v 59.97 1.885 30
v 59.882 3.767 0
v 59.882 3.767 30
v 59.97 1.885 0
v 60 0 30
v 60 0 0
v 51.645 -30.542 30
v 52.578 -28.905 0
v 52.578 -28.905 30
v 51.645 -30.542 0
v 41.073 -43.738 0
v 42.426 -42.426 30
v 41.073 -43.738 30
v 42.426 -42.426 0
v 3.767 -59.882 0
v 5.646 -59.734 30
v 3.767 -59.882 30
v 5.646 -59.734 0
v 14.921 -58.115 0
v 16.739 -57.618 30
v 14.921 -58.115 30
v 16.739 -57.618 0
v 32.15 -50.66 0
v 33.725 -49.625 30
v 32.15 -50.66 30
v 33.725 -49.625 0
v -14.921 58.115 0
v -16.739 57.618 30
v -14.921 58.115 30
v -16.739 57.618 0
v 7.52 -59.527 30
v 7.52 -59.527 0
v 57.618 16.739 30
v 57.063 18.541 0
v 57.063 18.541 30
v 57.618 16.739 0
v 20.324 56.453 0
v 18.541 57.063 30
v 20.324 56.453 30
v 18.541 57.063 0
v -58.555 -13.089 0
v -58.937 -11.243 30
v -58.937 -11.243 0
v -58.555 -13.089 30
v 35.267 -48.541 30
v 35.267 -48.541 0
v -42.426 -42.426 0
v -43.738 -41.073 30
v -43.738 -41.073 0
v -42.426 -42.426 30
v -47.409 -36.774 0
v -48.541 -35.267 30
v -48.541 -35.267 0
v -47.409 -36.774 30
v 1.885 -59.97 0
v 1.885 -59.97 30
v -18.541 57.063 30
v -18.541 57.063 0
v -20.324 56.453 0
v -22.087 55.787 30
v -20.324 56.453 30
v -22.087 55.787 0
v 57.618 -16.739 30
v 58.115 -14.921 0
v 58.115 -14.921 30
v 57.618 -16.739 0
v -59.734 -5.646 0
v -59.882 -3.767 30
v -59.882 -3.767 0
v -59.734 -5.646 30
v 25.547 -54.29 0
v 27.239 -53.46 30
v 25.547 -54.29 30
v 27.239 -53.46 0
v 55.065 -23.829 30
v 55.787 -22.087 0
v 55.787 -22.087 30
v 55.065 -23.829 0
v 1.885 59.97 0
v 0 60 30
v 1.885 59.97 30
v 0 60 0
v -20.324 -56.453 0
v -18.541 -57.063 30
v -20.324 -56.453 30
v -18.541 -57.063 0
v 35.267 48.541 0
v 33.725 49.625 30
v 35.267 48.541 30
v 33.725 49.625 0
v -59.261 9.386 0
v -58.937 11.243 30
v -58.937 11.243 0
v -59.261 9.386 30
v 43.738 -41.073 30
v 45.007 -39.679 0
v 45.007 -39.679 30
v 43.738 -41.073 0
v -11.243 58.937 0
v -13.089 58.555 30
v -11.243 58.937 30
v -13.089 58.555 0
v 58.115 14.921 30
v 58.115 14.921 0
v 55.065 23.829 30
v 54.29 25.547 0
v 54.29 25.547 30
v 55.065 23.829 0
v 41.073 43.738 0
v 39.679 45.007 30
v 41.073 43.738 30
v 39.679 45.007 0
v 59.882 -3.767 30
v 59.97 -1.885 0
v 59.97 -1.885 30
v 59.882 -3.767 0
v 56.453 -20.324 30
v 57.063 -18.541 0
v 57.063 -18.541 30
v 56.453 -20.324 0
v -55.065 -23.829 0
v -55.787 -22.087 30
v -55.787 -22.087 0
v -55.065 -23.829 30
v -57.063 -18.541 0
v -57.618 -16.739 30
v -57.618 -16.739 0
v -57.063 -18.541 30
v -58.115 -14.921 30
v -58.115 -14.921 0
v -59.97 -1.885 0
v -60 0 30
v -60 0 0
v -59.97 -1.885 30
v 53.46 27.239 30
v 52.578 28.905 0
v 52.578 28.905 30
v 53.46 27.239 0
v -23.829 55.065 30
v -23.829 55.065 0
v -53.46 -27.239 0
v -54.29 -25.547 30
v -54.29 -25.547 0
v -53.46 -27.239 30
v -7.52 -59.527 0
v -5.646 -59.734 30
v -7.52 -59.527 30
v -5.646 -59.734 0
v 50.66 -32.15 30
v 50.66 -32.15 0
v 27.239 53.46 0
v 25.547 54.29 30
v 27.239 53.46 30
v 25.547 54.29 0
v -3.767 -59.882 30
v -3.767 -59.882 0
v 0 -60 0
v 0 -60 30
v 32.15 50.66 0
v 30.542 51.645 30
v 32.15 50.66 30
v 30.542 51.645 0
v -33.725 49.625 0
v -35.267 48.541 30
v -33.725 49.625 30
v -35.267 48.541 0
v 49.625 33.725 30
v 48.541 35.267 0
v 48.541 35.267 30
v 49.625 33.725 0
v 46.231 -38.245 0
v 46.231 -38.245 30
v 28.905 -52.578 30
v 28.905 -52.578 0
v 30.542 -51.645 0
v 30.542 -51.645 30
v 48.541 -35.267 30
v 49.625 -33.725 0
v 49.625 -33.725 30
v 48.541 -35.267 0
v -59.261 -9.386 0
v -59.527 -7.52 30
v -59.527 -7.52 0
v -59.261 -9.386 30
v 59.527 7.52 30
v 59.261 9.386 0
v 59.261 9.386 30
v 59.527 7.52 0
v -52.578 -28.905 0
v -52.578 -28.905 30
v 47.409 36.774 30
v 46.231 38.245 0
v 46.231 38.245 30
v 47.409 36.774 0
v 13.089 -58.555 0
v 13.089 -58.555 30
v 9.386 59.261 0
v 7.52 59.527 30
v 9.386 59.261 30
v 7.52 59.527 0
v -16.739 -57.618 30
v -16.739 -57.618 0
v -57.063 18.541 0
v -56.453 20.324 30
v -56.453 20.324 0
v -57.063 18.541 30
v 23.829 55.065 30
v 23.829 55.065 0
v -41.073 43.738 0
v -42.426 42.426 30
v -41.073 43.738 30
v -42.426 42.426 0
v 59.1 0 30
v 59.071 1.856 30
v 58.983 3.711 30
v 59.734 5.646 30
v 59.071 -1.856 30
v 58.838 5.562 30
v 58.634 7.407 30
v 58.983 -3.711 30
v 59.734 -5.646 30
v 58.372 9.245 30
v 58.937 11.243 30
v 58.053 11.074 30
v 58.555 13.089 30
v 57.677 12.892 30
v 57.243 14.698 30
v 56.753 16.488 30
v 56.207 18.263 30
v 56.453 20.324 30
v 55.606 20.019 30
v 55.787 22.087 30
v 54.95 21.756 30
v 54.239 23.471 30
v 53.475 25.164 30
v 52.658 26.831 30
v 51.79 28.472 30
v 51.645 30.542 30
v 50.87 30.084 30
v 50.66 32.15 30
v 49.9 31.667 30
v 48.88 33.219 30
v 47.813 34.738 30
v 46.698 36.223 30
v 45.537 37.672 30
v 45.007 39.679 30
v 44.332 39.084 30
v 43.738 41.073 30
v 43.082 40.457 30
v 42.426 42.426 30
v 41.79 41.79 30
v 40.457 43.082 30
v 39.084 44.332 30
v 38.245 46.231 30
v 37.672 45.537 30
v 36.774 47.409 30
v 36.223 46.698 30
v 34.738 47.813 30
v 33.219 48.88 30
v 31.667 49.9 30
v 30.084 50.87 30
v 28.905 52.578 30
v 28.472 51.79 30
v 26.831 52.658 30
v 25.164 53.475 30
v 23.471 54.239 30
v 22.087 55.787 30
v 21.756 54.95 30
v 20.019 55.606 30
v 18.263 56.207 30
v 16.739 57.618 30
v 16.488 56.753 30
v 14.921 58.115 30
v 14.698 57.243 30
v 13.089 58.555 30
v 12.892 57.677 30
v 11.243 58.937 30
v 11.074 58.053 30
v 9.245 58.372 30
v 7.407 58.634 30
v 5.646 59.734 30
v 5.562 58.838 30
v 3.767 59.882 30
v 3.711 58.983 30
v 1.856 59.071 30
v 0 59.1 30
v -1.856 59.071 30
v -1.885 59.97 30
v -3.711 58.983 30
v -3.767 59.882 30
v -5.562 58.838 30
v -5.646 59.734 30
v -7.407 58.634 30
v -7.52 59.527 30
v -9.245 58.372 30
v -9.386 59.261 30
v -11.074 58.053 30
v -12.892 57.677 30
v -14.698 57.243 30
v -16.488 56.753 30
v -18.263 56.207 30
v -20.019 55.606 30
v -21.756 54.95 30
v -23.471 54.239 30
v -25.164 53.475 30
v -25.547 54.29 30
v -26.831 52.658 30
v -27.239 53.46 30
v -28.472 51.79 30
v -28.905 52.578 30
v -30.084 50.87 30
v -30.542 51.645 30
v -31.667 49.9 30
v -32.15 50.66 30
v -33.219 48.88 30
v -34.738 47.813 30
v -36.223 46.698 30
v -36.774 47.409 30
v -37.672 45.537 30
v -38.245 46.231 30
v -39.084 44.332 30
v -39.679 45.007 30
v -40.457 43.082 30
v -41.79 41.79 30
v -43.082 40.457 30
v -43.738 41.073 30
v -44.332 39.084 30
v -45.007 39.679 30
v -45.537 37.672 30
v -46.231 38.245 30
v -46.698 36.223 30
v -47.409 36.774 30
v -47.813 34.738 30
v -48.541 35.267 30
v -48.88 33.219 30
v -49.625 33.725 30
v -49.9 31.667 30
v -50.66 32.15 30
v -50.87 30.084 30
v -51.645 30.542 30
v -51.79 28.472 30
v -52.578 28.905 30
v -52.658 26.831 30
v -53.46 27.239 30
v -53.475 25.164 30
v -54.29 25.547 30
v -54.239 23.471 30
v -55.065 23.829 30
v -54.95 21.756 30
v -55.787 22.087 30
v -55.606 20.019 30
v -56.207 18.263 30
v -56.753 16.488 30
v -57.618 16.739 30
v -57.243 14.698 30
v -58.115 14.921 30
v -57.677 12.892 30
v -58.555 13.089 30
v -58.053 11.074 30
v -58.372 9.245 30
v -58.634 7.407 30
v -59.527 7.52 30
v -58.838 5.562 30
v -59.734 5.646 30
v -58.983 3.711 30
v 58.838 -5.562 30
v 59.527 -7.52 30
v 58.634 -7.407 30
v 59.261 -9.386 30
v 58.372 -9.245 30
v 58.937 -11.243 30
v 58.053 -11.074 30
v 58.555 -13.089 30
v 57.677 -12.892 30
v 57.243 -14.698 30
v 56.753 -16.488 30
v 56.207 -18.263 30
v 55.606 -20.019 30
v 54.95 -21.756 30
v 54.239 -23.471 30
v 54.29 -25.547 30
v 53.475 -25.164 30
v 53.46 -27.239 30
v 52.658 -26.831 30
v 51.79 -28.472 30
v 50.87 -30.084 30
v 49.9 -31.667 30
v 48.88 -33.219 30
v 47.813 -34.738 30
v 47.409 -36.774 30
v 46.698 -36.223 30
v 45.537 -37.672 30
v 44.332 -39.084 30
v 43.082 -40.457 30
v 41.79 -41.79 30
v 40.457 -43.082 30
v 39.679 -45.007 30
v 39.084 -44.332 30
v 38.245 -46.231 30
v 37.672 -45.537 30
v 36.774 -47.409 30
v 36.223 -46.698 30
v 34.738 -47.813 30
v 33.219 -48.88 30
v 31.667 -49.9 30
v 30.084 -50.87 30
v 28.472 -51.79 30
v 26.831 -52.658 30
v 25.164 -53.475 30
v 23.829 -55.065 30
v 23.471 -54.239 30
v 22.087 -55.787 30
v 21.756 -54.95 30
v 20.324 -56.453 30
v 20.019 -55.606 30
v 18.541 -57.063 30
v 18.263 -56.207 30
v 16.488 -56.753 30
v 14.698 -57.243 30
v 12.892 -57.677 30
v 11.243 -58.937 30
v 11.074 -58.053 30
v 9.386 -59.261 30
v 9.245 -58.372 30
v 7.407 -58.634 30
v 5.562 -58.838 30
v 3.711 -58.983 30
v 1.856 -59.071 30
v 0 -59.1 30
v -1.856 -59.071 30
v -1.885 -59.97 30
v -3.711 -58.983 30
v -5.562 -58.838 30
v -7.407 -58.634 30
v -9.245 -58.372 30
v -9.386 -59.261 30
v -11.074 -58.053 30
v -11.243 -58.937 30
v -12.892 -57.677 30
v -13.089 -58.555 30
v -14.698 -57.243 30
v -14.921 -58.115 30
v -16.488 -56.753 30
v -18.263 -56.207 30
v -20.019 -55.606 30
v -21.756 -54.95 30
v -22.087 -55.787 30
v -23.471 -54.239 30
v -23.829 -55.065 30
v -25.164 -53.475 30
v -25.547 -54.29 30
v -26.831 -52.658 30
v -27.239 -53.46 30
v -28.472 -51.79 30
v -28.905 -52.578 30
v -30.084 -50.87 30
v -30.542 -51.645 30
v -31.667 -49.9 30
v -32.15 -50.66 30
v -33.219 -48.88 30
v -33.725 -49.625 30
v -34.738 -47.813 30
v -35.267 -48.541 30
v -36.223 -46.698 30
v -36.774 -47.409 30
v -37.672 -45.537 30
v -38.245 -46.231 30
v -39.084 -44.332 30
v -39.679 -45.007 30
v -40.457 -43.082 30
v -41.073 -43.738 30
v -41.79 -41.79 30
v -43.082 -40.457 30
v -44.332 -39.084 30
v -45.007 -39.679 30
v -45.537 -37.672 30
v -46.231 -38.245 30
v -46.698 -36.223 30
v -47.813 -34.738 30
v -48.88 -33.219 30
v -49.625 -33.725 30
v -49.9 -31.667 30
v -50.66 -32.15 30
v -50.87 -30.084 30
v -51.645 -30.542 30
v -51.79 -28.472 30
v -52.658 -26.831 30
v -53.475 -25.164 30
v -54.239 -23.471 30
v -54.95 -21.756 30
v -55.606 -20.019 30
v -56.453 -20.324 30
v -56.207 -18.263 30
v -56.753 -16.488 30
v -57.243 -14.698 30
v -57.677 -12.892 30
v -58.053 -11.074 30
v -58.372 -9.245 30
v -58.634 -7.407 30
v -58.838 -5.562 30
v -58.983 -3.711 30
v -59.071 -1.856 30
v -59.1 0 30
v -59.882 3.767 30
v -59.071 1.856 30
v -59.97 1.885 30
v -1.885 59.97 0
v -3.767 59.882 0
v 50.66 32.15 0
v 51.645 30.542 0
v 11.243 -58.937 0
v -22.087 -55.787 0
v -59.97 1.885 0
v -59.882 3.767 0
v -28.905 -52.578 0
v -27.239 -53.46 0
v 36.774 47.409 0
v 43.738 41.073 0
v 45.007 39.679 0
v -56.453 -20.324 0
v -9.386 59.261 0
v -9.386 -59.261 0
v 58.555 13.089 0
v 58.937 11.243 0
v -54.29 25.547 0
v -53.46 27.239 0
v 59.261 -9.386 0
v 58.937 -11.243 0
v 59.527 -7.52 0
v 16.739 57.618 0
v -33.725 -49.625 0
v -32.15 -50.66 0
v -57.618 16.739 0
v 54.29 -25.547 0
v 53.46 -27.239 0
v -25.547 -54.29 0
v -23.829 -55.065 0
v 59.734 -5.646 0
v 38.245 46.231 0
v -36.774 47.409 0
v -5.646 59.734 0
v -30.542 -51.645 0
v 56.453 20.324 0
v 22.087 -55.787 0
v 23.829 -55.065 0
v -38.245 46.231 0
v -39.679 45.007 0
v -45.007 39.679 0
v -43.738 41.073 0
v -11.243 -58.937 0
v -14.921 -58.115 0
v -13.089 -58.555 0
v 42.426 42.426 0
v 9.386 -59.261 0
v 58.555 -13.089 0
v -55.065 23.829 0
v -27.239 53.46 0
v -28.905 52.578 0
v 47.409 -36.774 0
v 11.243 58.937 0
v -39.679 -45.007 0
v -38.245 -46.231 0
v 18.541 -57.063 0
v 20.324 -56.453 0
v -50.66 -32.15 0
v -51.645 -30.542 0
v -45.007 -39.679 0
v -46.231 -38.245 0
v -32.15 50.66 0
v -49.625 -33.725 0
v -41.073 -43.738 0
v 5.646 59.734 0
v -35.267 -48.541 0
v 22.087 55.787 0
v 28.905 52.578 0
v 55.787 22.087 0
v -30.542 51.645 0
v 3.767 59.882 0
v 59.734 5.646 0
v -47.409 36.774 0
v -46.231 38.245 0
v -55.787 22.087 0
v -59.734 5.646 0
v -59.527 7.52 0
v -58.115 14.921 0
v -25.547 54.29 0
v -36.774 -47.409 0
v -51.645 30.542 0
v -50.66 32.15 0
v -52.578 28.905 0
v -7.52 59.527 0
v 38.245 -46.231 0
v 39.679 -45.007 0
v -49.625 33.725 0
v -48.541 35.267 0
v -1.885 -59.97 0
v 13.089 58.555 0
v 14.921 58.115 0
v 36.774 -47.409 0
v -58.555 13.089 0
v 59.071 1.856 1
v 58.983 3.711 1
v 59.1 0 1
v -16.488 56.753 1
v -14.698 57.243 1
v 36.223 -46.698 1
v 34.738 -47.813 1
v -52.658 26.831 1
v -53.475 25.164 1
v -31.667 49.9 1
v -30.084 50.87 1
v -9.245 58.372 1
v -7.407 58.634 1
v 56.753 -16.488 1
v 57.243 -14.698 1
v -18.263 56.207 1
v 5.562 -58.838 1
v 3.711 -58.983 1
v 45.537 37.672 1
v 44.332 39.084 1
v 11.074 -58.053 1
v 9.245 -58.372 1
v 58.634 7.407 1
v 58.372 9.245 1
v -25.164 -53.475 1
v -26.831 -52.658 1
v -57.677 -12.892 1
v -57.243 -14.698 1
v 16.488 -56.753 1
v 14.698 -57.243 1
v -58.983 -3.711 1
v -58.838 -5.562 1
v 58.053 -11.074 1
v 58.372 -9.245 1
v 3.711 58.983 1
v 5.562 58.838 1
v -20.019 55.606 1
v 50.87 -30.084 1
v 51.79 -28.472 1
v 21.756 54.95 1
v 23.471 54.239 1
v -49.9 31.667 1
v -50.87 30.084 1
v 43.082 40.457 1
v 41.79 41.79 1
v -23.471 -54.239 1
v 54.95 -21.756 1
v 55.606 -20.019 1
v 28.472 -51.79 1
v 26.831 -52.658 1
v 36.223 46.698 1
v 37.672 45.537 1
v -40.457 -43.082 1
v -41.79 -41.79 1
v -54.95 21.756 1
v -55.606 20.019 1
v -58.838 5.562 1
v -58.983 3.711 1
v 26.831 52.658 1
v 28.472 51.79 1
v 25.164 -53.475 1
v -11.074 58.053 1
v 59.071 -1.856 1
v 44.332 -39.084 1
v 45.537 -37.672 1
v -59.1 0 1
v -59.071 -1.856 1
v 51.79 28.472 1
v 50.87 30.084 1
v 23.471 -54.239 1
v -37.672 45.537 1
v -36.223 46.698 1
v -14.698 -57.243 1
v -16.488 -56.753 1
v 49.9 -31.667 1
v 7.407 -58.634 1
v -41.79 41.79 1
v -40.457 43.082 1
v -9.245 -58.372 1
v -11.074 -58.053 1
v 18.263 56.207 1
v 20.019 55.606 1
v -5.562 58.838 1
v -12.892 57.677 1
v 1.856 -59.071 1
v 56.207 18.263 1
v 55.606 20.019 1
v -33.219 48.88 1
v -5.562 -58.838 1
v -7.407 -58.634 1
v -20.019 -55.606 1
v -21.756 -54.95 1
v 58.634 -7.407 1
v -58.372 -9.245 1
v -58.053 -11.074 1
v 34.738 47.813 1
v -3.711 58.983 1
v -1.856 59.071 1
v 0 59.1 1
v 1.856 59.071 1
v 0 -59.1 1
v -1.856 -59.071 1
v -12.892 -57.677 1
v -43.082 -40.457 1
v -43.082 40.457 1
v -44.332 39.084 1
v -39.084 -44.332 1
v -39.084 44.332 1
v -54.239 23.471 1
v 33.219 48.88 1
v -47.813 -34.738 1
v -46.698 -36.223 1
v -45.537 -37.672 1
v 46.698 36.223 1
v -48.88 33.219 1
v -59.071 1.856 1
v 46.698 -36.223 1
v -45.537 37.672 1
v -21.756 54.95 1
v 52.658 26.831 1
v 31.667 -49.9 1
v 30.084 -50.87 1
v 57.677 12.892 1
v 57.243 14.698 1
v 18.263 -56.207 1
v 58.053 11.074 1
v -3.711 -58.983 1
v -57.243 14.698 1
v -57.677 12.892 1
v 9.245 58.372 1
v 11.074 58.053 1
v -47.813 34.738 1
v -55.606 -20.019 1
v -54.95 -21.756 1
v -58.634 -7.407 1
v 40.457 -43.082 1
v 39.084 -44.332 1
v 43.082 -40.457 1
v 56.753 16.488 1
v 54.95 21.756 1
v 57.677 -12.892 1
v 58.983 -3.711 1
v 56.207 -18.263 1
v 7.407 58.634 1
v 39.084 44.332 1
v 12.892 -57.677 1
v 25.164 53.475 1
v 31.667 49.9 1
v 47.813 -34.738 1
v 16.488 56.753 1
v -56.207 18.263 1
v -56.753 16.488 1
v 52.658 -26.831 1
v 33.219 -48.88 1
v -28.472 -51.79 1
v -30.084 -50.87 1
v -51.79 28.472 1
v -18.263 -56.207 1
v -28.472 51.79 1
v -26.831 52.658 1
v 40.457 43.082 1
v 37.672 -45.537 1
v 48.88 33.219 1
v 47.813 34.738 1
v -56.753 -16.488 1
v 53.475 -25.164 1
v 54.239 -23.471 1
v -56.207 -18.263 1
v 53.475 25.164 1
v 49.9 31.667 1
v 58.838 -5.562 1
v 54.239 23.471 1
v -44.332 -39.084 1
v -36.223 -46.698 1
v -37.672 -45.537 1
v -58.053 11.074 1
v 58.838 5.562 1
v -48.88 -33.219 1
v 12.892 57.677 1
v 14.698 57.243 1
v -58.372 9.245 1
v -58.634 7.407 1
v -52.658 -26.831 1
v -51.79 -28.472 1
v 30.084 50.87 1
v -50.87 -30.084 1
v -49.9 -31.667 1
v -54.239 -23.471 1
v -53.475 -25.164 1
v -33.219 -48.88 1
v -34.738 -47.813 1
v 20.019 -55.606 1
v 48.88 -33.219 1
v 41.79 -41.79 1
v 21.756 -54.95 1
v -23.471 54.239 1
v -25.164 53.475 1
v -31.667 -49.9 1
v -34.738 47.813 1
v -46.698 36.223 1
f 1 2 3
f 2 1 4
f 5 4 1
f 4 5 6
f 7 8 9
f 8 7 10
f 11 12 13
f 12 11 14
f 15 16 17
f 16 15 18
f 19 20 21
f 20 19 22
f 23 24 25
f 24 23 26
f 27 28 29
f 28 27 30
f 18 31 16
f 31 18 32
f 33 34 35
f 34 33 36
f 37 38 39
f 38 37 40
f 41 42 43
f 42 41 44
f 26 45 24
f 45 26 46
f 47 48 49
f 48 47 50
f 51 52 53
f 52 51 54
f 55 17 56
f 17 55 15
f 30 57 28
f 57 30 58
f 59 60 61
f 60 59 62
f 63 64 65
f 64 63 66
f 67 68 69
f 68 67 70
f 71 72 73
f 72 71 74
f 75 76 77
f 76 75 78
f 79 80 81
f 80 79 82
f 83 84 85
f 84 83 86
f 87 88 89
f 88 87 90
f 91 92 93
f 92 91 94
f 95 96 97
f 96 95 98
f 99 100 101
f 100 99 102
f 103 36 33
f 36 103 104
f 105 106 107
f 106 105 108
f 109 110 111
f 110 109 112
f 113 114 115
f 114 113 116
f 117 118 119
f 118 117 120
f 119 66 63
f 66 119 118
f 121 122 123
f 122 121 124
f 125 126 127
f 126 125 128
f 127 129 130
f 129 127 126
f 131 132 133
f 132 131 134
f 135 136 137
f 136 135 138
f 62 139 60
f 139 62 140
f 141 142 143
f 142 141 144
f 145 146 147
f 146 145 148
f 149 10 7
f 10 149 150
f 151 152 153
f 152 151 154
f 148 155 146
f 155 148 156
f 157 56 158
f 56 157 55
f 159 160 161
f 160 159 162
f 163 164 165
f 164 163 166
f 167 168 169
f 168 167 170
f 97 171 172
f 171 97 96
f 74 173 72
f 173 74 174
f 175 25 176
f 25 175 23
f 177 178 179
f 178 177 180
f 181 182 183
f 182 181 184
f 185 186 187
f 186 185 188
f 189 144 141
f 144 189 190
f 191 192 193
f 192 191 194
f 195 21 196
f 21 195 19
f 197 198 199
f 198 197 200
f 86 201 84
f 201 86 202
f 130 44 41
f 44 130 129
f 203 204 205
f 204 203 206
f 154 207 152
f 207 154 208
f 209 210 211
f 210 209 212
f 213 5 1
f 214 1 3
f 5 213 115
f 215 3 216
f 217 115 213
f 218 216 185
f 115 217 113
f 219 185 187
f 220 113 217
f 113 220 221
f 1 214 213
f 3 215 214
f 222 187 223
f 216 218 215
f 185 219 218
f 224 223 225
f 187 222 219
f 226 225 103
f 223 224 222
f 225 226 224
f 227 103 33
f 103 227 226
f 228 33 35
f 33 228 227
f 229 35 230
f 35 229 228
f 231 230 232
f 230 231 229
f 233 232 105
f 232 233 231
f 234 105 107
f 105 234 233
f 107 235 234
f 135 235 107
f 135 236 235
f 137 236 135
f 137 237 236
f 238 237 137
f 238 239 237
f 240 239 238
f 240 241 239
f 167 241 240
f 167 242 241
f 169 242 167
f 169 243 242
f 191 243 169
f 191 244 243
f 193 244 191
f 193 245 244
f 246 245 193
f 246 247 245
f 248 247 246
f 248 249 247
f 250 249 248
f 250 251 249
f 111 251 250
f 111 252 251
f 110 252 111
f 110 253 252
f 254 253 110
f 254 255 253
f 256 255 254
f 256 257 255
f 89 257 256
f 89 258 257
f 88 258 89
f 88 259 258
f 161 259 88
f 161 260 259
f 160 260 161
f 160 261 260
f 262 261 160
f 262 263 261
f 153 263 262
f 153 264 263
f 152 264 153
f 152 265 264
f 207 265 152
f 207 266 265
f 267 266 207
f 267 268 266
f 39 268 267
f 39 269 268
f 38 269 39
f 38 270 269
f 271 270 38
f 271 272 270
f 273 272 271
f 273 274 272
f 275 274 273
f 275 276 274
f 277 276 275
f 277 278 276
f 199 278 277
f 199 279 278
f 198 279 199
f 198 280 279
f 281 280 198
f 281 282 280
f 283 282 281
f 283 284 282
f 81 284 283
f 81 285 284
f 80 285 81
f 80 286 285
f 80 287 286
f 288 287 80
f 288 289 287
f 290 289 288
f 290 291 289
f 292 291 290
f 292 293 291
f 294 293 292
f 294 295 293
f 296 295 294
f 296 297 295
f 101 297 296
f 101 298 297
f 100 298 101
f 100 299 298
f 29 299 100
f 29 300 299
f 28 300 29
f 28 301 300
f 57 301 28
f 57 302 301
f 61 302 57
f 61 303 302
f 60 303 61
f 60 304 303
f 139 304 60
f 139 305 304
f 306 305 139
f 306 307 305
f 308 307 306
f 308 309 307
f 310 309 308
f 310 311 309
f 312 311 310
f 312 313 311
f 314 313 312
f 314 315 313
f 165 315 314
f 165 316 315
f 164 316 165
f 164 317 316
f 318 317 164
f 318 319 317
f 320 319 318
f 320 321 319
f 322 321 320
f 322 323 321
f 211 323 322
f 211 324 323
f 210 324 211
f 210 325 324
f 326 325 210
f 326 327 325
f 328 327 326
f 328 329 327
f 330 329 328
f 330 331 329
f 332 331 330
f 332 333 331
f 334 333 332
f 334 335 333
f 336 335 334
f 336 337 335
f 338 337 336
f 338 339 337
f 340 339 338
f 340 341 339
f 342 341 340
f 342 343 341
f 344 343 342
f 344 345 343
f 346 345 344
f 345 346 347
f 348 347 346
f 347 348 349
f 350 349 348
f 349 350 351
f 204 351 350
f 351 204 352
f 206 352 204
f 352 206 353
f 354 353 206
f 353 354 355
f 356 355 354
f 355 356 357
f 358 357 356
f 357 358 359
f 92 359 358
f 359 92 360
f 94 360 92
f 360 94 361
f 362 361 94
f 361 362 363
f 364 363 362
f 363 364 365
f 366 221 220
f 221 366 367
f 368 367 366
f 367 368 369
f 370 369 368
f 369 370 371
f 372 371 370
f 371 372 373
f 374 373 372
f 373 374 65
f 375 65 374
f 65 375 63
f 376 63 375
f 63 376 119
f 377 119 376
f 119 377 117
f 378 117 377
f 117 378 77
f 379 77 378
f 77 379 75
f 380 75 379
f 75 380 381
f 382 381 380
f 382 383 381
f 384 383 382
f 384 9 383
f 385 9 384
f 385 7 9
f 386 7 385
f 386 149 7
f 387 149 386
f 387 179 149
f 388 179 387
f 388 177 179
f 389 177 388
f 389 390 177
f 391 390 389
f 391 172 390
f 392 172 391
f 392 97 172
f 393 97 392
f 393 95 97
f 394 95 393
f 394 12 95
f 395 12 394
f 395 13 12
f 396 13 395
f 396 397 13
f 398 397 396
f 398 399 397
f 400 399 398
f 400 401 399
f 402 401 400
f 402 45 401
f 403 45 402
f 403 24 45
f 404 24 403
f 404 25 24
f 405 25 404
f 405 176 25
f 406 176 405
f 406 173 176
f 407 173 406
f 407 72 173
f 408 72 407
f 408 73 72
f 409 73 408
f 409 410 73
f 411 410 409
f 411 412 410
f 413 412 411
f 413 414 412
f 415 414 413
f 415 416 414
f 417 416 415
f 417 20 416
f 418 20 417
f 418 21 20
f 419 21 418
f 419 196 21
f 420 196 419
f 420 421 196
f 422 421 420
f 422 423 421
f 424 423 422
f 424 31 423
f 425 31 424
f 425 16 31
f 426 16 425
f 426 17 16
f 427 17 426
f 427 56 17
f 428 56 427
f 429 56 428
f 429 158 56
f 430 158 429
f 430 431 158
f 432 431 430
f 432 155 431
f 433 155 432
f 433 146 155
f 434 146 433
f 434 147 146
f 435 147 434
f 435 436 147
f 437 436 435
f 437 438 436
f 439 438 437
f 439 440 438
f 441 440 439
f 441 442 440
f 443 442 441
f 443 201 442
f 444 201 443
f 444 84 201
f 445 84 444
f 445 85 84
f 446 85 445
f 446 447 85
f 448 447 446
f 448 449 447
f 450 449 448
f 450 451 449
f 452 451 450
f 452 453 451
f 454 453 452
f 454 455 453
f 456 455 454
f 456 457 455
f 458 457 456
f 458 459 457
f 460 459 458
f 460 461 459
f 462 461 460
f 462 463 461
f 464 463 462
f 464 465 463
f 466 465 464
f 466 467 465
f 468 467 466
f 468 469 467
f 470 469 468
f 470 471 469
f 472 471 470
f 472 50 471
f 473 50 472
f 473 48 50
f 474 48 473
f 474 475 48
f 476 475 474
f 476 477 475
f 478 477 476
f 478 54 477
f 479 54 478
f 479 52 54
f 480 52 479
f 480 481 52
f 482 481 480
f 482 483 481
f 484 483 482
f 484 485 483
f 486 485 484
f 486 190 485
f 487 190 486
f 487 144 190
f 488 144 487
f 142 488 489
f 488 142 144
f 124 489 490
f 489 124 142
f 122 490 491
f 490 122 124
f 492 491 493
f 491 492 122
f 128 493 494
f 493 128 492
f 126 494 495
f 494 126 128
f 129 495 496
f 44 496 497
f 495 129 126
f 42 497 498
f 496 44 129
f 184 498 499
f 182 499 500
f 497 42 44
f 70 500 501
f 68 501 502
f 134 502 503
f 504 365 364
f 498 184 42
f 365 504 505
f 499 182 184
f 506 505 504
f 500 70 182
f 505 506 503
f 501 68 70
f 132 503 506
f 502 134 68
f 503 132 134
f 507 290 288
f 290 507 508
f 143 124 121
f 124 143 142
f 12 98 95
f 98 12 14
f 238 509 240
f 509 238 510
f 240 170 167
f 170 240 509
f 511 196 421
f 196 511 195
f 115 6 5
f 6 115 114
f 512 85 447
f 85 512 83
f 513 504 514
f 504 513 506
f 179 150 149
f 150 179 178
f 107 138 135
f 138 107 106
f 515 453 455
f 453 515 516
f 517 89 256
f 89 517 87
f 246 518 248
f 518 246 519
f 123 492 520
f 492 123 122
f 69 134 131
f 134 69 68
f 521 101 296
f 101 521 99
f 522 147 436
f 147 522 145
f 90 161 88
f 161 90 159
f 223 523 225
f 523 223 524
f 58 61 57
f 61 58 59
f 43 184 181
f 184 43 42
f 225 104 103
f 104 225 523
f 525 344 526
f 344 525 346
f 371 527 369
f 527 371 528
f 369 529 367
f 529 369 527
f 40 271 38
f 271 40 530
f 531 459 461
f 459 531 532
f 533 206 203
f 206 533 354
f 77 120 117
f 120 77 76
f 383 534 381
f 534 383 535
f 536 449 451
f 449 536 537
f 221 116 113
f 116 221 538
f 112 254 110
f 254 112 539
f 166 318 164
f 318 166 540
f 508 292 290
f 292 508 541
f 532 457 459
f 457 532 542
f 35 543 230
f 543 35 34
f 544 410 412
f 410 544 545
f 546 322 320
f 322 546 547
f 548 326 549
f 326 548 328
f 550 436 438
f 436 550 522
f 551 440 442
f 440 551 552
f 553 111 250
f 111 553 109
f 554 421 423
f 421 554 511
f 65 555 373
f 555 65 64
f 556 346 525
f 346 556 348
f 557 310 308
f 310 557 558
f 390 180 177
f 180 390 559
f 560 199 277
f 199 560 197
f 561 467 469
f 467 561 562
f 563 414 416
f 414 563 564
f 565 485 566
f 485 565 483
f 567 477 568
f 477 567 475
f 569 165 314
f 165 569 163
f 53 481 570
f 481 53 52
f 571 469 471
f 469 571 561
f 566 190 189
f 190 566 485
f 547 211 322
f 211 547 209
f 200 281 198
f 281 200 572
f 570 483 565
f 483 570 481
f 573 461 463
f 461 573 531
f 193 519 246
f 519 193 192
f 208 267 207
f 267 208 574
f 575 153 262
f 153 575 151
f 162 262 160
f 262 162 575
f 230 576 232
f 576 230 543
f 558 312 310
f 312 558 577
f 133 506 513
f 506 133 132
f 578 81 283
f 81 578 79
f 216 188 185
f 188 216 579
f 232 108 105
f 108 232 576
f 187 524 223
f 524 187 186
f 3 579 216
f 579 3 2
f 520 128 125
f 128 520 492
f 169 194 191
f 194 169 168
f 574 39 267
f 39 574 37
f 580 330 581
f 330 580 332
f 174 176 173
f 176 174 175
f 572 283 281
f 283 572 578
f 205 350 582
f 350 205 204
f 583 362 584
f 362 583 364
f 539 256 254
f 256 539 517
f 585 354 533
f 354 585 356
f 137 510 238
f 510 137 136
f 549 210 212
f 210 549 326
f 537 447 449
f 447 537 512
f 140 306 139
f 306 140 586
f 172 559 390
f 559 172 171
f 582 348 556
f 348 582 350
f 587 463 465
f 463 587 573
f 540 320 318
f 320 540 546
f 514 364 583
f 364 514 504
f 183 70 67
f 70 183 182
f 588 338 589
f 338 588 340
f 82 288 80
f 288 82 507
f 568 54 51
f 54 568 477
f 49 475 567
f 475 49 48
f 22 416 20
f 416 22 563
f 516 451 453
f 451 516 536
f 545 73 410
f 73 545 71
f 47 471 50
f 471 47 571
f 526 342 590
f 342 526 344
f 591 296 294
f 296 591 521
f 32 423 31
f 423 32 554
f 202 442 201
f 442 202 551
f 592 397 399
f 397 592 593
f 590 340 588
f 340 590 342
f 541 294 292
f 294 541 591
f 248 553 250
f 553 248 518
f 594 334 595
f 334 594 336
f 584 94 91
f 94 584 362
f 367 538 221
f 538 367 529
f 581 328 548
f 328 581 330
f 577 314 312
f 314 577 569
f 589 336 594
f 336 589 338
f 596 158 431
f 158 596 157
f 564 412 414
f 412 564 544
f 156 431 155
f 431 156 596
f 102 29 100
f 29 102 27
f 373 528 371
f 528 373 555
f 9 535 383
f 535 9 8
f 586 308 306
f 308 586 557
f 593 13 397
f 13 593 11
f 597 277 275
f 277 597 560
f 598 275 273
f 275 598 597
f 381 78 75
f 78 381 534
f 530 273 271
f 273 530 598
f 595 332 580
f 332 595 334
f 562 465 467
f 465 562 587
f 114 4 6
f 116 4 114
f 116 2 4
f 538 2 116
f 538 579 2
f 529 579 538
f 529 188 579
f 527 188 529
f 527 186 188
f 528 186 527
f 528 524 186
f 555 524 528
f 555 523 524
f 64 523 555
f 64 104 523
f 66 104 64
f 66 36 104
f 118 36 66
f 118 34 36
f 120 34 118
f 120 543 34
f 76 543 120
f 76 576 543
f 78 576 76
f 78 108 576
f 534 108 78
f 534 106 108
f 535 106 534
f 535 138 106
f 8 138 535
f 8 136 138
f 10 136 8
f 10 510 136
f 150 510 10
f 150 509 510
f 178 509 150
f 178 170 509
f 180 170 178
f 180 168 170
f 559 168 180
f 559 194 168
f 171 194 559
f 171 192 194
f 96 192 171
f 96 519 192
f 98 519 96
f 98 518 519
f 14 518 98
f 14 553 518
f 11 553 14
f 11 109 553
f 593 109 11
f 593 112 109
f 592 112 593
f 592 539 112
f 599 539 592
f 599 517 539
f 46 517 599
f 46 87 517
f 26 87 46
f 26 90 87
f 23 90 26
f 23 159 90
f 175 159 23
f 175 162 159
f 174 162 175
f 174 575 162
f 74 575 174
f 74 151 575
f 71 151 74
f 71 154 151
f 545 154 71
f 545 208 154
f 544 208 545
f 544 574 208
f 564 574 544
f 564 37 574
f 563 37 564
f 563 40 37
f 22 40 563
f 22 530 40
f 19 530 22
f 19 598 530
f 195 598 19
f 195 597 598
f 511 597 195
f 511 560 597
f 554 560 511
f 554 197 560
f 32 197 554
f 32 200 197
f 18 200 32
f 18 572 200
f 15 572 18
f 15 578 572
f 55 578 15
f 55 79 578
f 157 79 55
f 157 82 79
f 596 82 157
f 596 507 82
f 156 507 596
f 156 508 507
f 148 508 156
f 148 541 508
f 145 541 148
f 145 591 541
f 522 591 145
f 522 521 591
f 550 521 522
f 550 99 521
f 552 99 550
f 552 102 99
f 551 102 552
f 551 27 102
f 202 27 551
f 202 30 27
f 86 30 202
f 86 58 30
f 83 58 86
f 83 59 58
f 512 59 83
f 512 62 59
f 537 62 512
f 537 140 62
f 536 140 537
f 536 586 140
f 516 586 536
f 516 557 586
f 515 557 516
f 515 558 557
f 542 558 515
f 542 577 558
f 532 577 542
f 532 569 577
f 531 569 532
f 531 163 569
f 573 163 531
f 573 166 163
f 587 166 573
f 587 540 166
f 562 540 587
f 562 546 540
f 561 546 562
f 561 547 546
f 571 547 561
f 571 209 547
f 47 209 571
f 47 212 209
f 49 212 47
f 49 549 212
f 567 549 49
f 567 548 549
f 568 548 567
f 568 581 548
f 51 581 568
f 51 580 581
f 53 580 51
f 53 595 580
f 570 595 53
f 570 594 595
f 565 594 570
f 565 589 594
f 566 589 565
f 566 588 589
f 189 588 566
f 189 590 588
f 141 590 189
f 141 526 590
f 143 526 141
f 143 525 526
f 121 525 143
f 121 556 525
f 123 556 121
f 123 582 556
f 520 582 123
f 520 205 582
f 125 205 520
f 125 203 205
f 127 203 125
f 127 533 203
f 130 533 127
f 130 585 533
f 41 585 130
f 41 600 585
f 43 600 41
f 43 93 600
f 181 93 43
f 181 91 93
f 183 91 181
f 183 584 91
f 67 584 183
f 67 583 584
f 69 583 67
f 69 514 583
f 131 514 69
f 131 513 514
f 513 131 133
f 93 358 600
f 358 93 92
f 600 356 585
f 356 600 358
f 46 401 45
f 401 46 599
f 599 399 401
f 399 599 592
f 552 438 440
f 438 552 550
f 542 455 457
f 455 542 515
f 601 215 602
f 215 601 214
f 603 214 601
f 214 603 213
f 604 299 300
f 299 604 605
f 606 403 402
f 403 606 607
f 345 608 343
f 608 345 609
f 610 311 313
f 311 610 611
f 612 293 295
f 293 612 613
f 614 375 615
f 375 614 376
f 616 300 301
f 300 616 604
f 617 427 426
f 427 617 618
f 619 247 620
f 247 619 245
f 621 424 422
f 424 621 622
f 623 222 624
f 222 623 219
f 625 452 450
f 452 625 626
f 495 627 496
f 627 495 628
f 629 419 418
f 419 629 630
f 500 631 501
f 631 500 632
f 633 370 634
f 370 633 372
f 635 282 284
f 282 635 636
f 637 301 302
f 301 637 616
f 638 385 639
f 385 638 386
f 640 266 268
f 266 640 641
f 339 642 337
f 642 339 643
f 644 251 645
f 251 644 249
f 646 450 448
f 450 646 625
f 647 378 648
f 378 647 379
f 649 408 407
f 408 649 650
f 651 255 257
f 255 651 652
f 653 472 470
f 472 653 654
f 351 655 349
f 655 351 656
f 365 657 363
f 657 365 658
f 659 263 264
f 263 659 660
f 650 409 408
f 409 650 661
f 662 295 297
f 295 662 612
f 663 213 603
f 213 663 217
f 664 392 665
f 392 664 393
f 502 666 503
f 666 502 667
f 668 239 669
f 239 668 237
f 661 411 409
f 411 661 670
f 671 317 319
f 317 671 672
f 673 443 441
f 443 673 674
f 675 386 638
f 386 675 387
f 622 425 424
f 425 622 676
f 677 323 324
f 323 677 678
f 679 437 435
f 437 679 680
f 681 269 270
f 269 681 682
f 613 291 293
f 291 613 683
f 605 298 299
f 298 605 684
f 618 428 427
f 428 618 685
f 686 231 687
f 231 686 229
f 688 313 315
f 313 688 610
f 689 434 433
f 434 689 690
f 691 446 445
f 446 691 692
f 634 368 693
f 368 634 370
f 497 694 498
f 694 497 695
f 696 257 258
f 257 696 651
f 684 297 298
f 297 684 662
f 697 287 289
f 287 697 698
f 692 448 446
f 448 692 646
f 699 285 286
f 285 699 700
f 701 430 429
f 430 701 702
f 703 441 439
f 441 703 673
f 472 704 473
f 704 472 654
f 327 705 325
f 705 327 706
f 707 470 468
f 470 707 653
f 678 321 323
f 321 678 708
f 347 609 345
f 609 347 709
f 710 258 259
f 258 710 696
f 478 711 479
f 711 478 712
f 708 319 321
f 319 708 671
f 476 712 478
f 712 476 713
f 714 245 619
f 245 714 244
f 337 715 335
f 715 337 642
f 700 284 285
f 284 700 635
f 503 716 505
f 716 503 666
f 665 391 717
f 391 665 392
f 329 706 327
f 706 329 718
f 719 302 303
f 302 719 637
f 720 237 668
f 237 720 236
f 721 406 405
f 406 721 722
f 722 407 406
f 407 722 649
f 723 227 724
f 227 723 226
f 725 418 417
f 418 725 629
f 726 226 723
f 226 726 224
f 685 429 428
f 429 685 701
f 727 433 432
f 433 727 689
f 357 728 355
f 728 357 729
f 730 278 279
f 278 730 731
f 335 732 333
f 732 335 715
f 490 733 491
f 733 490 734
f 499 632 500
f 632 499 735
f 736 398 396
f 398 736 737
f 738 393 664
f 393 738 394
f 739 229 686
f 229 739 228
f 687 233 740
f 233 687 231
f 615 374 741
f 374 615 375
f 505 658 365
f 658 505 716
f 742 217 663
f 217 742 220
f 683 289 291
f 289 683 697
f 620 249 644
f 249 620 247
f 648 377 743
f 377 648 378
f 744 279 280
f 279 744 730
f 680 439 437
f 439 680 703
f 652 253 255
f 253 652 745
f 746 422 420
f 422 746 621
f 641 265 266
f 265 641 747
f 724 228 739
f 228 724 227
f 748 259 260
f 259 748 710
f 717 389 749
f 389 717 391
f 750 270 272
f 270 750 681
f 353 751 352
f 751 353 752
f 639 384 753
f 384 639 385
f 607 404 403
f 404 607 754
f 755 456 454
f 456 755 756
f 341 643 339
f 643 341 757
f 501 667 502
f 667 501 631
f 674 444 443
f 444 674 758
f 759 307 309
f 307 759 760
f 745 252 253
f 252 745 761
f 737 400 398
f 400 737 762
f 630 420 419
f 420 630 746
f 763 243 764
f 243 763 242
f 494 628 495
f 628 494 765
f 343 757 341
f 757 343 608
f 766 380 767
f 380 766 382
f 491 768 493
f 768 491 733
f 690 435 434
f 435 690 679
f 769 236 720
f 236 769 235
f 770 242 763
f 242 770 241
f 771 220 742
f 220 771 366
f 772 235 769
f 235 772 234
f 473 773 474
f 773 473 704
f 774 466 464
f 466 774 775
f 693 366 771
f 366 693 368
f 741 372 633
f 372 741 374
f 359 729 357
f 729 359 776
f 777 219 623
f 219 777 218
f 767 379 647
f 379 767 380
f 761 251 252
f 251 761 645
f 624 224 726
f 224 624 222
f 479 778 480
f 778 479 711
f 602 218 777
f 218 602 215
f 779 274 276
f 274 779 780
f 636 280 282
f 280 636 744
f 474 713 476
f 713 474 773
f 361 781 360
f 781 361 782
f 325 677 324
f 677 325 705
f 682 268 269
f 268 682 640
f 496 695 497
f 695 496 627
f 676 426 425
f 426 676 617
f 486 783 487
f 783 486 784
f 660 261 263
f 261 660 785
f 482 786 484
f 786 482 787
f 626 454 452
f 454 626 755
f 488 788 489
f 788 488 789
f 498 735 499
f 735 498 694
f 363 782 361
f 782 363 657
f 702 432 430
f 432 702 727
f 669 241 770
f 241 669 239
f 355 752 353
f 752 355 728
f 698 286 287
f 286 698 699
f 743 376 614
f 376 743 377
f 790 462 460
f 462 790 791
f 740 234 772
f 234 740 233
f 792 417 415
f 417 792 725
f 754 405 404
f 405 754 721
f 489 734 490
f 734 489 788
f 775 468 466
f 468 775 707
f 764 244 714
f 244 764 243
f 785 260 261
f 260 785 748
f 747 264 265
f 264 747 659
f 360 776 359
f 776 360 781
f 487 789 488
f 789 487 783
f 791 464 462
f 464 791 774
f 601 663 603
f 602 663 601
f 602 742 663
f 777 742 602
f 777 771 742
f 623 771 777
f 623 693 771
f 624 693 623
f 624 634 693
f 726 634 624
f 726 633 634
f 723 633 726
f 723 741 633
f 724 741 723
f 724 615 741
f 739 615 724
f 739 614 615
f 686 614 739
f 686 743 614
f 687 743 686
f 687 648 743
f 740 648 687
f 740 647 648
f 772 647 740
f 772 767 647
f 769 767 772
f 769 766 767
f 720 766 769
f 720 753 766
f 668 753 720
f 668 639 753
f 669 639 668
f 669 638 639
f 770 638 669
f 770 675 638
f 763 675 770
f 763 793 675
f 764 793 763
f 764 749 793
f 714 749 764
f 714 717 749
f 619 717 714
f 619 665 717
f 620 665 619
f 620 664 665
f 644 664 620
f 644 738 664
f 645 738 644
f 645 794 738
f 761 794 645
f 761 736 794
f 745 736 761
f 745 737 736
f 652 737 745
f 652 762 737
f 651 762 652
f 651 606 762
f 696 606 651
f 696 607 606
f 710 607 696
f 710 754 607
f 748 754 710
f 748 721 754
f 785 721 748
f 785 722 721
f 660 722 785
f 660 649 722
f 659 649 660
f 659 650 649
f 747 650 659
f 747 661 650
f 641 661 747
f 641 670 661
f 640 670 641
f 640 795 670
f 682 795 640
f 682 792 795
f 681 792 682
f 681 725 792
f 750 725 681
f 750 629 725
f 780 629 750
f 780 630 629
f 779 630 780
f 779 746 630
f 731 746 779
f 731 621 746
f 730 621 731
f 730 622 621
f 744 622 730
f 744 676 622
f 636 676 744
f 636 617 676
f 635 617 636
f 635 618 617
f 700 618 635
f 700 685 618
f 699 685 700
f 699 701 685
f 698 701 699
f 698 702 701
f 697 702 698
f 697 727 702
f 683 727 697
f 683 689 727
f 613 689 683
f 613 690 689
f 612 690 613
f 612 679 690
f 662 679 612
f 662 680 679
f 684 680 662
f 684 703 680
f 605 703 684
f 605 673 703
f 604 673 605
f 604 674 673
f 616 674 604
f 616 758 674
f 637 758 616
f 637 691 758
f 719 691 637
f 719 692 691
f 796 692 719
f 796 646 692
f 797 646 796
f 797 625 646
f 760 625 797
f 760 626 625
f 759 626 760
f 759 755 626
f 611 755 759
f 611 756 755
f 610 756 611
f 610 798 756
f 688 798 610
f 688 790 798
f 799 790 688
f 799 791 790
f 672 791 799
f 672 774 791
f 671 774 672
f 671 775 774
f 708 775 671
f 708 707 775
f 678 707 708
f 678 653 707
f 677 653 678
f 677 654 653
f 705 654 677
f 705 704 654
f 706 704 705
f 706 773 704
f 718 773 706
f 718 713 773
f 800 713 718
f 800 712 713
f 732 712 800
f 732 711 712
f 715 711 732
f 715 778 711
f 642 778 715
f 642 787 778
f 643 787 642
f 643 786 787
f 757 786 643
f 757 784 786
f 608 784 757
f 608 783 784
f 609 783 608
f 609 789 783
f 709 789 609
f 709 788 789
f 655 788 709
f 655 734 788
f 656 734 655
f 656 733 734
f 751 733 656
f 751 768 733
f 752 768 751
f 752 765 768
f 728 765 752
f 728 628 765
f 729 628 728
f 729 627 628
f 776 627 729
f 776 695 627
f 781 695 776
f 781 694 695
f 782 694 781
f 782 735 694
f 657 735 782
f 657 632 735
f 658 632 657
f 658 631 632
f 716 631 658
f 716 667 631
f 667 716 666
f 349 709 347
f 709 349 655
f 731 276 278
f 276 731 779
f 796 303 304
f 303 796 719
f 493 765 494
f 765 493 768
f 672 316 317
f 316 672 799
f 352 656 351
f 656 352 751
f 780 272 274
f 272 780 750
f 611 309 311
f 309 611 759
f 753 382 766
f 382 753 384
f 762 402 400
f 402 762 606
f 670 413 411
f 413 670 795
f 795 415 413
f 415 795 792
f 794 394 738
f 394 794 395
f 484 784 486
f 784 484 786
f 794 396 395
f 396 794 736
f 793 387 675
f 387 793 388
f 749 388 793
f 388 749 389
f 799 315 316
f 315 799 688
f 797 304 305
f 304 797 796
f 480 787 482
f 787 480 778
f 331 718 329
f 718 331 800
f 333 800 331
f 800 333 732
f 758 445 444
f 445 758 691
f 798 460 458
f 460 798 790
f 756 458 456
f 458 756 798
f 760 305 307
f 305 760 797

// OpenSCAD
diameter = 2 * 60;
height = 90 - 20;

module jar() {
    difference(){
        union() {
            cylinder(d = diameter, h = height, center = false, $fn = 200);
            cylinder(d = diameter - 2, h = height + 20, center = false, $fn = 200);
        }
        translate([0,0,1])cylinder(d = diameter - 4, h = height + 20, center = false, $fn = 200);
    }
}

module lid() {
    difference(){
        cylinder(d = diameter, h = 30, center = false, $fn = 200);
        translate([0,0,1])cylinder(d = diameter + 0.2 - 2, h = 30, center = false, $fn = 200);
    }
}

//jar();
lid();
